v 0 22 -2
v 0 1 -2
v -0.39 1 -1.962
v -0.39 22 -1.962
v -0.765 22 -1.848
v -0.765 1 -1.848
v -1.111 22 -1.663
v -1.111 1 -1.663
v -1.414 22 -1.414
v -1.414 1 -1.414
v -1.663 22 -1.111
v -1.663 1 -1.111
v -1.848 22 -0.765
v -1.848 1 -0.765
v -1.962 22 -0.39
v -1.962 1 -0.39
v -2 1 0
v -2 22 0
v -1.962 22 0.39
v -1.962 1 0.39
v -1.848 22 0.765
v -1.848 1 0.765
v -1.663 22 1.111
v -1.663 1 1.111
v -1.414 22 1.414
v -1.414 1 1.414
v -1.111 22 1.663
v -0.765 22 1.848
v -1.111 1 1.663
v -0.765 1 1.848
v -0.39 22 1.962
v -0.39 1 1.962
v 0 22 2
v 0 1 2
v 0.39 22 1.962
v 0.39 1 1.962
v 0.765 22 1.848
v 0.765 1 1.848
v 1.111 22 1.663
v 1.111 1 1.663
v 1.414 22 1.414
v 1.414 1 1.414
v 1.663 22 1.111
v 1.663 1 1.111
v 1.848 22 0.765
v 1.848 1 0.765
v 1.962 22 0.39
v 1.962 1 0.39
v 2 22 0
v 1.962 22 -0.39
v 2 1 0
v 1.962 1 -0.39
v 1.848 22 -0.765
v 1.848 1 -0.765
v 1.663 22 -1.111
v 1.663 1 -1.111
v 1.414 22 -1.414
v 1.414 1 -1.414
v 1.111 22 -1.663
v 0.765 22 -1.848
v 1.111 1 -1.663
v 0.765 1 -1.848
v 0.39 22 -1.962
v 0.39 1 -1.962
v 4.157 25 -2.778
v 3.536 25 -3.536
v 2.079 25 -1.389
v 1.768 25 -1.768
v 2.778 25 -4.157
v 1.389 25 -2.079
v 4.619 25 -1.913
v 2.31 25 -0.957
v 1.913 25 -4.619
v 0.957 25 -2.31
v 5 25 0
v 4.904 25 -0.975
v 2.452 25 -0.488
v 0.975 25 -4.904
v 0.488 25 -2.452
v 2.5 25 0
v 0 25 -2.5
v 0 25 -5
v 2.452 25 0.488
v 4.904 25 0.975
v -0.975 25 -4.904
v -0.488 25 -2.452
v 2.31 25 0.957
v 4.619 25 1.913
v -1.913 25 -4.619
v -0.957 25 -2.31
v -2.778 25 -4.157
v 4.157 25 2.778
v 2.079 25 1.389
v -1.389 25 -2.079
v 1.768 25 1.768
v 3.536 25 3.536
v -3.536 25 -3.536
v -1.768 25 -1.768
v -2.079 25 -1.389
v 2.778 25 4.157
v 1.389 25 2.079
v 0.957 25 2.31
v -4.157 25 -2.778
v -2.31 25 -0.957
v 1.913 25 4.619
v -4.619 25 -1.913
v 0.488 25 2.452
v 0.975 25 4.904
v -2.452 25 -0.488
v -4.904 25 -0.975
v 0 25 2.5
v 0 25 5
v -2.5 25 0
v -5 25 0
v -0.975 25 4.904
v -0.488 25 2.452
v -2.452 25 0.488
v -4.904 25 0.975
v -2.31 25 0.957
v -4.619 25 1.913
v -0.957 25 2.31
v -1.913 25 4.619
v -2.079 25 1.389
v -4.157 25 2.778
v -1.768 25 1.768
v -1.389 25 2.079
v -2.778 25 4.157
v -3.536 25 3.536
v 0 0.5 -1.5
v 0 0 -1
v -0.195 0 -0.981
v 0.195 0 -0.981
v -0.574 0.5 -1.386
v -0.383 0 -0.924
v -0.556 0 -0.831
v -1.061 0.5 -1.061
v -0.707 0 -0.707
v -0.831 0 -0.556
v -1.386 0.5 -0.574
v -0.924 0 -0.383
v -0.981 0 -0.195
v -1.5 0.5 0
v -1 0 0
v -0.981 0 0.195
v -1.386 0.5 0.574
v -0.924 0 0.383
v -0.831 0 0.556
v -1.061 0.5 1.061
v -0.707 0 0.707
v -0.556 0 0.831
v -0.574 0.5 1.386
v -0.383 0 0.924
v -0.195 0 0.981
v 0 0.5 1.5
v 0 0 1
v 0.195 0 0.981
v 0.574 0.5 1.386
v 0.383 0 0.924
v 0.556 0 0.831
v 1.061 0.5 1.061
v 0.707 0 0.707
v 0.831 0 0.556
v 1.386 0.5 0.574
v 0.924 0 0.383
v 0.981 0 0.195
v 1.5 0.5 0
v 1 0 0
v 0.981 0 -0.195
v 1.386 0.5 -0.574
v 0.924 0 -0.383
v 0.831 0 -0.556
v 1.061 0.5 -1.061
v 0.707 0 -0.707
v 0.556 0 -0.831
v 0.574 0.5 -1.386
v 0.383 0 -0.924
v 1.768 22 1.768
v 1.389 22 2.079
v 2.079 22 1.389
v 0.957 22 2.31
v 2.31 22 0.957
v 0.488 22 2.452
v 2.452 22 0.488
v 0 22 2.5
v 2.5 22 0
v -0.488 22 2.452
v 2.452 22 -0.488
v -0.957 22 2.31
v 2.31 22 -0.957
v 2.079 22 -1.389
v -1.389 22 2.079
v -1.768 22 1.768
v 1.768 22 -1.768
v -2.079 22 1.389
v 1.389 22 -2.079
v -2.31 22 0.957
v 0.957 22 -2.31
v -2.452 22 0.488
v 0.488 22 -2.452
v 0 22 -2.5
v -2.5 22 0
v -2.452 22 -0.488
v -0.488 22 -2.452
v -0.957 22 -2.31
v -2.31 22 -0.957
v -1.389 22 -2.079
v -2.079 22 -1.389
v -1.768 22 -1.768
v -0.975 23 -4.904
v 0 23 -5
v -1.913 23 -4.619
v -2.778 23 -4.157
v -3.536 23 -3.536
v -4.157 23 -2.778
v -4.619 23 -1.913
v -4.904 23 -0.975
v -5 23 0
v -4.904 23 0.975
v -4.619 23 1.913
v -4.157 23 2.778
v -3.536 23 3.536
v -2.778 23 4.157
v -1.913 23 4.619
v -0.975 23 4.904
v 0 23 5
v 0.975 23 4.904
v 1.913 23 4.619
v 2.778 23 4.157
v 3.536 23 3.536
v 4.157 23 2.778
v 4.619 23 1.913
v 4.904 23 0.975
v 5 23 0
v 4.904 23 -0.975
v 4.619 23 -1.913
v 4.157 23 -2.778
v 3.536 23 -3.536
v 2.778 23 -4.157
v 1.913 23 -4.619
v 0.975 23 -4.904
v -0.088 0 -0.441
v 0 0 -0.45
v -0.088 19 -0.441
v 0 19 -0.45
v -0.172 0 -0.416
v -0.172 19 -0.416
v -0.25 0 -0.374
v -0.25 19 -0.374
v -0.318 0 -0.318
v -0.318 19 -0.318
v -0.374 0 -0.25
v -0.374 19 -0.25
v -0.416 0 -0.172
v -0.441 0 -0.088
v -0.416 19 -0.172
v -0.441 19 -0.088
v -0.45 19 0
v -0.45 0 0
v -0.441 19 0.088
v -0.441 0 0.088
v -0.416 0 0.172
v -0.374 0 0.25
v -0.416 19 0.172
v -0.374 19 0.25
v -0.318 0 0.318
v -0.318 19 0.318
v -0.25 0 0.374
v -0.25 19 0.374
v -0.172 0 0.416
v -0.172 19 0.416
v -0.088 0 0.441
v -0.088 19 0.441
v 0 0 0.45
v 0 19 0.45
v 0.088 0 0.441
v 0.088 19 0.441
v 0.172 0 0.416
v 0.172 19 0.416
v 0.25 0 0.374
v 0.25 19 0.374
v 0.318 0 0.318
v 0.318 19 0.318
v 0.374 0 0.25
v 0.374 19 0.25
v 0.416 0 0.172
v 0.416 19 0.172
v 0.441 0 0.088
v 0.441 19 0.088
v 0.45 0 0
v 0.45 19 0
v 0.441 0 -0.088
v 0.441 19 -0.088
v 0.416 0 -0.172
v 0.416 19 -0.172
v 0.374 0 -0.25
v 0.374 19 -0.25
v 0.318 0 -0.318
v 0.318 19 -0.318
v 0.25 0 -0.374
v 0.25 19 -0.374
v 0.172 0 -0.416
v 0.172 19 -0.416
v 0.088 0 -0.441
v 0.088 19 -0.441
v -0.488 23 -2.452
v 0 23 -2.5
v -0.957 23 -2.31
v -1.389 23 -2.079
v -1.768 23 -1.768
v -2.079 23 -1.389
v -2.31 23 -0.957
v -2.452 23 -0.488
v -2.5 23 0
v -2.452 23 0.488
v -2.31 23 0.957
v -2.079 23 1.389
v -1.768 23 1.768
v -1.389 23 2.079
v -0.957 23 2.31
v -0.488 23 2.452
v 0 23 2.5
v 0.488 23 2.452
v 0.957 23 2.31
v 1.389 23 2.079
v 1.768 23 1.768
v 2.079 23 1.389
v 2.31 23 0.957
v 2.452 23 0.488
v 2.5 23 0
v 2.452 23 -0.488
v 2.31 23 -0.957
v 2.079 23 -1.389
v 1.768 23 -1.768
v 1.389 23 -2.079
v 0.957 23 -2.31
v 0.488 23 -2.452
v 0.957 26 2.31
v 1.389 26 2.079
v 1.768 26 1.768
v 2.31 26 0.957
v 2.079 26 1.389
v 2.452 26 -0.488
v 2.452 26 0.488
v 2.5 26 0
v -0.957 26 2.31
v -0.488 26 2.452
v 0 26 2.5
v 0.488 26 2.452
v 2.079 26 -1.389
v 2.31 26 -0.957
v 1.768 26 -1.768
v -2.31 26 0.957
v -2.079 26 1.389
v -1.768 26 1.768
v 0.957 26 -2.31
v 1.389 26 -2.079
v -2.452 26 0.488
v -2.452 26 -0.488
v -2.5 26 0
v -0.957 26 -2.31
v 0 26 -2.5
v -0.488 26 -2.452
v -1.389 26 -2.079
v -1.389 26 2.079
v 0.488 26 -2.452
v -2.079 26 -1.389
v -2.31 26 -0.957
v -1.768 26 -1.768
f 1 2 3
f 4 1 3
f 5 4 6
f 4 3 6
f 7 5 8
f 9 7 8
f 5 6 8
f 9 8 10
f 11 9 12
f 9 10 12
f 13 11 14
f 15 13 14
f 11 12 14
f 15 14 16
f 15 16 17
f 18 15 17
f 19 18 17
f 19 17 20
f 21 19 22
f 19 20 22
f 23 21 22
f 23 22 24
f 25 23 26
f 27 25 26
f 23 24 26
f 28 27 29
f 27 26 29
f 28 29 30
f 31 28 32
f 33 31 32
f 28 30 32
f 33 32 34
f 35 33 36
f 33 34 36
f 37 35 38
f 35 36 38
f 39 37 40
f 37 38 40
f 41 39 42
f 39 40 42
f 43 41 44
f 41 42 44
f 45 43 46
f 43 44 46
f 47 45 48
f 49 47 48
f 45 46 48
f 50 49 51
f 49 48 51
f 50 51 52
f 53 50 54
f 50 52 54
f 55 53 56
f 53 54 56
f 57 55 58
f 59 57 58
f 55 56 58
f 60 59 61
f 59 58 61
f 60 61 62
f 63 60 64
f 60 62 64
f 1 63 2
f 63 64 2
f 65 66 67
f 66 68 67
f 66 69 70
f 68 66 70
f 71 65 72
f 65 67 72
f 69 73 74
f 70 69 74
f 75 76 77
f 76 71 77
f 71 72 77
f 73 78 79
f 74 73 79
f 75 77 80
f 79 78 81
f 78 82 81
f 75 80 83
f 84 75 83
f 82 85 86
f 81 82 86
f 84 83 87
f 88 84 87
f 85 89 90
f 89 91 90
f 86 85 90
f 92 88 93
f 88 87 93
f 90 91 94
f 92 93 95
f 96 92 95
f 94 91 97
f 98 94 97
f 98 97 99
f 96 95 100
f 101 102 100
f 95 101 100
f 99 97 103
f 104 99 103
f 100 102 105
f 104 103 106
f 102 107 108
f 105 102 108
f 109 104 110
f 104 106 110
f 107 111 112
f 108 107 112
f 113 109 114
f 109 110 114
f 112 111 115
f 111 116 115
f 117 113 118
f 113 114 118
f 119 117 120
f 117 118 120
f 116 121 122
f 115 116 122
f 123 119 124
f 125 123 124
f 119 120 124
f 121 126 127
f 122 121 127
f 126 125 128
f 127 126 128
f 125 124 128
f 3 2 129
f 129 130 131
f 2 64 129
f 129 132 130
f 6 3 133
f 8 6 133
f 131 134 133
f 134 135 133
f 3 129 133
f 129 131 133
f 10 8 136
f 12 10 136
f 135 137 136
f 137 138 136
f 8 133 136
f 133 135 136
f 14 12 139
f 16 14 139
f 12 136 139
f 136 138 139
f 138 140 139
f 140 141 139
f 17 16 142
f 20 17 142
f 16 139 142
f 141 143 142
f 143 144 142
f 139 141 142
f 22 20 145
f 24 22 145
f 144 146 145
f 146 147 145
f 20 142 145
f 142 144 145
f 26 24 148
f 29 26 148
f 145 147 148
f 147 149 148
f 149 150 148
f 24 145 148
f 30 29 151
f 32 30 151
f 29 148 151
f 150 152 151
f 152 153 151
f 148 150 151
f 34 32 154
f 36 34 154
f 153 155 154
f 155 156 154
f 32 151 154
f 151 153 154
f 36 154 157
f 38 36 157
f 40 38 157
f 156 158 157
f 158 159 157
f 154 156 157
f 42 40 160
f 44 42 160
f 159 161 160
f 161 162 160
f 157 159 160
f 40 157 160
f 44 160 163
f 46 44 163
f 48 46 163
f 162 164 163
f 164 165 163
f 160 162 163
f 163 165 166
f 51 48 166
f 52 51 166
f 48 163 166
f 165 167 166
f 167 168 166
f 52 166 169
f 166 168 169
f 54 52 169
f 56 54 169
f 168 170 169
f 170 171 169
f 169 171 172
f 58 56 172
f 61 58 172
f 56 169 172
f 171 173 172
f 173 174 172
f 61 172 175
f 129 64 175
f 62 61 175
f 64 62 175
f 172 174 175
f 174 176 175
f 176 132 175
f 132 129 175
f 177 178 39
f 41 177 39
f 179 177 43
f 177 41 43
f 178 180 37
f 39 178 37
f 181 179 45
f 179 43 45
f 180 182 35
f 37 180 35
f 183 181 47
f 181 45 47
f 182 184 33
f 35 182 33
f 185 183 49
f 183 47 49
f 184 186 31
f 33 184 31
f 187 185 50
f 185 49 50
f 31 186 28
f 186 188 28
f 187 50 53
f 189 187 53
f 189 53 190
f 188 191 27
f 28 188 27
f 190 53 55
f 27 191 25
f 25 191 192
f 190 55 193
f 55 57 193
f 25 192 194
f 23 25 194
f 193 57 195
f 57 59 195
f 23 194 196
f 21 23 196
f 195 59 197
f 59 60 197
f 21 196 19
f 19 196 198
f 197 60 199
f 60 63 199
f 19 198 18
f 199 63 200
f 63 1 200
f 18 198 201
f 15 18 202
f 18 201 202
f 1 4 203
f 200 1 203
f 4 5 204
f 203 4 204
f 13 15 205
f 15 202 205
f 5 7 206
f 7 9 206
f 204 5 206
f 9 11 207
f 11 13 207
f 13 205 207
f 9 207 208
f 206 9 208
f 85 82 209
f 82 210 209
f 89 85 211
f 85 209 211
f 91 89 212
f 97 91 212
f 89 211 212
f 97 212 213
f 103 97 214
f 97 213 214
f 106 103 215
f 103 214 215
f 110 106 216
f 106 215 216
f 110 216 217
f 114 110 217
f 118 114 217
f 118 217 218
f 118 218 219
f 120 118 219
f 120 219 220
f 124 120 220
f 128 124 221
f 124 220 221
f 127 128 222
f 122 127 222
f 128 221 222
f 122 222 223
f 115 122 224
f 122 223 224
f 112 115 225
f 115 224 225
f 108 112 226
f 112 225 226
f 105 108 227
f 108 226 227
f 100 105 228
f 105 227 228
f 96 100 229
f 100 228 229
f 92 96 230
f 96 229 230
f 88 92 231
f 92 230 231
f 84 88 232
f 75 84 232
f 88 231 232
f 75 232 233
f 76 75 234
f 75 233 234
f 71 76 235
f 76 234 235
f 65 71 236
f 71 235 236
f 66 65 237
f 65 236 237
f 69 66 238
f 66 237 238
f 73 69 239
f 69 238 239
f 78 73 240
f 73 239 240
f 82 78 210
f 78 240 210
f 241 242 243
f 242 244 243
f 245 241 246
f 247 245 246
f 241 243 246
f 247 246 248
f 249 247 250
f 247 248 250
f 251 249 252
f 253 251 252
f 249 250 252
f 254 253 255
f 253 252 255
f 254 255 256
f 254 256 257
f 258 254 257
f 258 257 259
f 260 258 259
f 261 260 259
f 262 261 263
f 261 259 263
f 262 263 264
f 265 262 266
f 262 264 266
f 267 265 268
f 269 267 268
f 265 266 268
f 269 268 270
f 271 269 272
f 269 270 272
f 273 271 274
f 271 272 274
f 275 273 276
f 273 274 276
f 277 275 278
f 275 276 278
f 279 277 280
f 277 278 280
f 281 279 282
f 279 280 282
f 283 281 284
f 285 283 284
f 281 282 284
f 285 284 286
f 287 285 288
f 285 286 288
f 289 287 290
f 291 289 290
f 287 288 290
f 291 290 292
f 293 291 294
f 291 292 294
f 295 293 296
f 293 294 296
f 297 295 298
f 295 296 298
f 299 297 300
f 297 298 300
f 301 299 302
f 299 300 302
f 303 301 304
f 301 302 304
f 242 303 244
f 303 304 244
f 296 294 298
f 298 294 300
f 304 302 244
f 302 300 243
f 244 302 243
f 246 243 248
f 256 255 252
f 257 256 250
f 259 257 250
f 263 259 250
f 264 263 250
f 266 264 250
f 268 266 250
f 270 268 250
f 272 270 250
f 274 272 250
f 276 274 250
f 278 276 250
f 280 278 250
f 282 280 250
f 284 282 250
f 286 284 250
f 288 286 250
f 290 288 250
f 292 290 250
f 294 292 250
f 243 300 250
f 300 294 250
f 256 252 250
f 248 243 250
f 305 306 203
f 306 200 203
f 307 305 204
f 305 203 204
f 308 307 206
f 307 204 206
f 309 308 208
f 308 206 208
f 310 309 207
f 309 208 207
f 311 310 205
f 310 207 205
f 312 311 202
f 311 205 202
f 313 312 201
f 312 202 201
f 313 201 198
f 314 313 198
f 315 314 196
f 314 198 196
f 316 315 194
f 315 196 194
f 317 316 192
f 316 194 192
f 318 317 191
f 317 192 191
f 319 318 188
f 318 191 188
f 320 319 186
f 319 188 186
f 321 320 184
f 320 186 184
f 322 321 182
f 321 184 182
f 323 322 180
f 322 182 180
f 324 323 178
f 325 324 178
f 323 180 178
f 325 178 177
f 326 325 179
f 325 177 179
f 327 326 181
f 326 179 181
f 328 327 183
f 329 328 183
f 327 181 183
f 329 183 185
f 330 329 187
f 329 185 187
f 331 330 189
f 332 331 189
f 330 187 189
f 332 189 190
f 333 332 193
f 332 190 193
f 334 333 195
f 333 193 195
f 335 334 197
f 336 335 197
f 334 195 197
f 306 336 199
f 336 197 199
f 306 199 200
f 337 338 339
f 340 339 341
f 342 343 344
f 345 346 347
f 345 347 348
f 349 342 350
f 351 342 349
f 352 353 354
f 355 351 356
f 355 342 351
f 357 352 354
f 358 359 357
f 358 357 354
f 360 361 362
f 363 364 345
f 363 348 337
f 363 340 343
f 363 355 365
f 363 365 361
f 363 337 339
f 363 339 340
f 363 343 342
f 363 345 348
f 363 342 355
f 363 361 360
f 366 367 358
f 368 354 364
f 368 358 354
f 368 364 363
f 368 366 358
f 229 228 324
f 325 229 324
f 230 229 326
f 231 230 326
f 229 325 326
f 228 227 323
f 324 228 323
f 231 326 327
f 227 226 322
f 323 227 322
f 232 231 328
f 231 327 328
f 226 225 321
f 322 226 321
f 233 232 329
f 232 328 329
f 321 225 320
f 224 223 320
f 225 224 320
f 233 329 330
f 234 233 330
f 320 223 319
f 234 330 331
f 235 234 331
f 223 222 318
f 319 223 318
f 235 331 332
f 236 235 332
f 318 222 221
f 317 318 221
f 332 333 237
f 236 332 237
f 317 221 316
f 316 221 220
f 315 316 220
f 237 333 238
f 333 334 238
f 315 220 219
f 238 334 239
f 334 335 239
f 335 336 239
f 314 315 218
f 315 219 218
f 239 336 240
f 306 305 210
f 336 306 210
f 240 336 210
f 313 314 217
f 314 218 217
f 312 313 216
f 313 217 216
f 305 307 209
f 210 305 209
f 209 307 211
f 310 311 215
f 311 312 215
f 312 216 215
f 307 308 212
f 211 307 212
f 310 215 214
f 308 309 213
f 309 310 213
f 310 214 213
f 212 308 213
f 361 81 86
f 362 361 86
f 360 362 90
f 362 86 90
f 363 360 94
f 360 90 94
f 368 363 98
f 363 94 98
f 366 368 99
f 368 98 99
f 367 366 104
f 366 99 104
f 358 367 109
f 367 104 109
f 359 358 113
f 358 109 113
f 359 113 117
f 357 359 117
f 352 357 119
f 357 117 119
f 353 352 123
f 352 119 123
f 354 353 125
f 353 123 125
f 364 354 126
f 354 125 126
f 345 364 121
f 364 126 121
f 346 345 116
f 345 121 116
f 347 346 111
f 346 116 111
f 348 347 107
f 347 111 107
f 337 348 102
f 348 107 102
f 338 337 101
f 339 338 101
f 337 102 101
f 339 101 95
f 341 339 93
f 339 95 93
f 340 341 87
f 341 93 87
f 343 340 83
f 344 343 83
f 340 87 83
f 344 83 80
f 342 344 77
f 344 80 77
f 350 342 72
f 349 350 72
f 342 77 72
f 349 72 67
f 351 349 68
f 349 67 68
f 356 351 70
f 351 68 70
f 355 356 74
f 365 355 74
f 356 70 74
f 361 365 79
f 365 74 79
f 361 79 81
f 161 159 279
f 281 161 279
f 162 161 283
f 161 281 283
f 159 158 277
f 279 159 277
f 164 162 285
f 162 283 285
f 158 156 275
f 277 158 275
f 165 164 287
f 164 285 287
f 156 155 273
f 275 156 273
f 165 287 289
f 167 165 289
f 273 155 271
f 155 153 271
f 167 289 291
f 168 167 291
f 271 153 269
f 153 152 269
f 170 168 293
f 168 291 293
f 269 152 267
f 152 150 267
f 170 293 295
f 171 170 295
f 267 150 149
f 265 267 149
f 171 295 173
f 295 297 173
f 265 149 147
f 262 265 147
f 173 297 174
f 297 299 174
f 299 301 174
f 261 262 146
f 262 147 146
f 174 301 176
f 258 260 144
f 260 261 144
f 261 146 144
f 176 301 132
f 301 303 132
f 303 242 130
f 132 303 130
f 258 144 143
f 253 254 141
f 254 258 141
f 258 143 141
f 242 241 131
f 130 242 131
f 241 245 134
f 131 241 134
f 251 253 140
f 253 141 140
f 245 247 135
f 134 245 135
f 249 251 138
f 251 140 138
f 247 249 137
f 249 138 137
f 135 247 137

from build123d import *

# Parameters (mm, degrees)
CHAMFER1_SIZE       = 1
SKETCH2_R           = 2.5
BOSS_EXTRUDE1_DEPTH = 1


with BuildPart() as part:
    # Sketch1 → Revolve1 (revolve)
    with BuildSketch(Plane.XY, mode=Mode.PRIVATE) as revolve1_sk:
        Polygon((0, 25), (-5, 25), (-5, 23), (-2.5, 23), (-2.5, 22), (-2, 22), (-2, 0), (-0.45, 0), (-0.45, 19), (0, 19), align=None)
    revolve(revolve1_sk.sketch.rotate(Axis((0, 0, 0), (0, 1, 0)), 270), axis=Axis((0, 0, 0), (0, 1, 0)))

    # Chamfer1
    chamfer1_edges = [part.edges().sort_by_distance(p)[0] for p in [
        (0, 0, 2),
    ]]
    chamfer(chamfer1_edges, length=CHAMFER1_SIZE)

    # Sketch2 → Boss-Extrude1 (add)
    with BuildSketch(Plane(origin=(0, 25, 0), x_dir=(1, 0, 0), z_dir=(0, 1, 0))):
        with Locations(Location((0, 0, 0), (0, 0, 90))):
            Circle(SKETCH2_R)
    extrude(amount=BOSS_EXTRUDE1_DEPTH)


solid = part.part
